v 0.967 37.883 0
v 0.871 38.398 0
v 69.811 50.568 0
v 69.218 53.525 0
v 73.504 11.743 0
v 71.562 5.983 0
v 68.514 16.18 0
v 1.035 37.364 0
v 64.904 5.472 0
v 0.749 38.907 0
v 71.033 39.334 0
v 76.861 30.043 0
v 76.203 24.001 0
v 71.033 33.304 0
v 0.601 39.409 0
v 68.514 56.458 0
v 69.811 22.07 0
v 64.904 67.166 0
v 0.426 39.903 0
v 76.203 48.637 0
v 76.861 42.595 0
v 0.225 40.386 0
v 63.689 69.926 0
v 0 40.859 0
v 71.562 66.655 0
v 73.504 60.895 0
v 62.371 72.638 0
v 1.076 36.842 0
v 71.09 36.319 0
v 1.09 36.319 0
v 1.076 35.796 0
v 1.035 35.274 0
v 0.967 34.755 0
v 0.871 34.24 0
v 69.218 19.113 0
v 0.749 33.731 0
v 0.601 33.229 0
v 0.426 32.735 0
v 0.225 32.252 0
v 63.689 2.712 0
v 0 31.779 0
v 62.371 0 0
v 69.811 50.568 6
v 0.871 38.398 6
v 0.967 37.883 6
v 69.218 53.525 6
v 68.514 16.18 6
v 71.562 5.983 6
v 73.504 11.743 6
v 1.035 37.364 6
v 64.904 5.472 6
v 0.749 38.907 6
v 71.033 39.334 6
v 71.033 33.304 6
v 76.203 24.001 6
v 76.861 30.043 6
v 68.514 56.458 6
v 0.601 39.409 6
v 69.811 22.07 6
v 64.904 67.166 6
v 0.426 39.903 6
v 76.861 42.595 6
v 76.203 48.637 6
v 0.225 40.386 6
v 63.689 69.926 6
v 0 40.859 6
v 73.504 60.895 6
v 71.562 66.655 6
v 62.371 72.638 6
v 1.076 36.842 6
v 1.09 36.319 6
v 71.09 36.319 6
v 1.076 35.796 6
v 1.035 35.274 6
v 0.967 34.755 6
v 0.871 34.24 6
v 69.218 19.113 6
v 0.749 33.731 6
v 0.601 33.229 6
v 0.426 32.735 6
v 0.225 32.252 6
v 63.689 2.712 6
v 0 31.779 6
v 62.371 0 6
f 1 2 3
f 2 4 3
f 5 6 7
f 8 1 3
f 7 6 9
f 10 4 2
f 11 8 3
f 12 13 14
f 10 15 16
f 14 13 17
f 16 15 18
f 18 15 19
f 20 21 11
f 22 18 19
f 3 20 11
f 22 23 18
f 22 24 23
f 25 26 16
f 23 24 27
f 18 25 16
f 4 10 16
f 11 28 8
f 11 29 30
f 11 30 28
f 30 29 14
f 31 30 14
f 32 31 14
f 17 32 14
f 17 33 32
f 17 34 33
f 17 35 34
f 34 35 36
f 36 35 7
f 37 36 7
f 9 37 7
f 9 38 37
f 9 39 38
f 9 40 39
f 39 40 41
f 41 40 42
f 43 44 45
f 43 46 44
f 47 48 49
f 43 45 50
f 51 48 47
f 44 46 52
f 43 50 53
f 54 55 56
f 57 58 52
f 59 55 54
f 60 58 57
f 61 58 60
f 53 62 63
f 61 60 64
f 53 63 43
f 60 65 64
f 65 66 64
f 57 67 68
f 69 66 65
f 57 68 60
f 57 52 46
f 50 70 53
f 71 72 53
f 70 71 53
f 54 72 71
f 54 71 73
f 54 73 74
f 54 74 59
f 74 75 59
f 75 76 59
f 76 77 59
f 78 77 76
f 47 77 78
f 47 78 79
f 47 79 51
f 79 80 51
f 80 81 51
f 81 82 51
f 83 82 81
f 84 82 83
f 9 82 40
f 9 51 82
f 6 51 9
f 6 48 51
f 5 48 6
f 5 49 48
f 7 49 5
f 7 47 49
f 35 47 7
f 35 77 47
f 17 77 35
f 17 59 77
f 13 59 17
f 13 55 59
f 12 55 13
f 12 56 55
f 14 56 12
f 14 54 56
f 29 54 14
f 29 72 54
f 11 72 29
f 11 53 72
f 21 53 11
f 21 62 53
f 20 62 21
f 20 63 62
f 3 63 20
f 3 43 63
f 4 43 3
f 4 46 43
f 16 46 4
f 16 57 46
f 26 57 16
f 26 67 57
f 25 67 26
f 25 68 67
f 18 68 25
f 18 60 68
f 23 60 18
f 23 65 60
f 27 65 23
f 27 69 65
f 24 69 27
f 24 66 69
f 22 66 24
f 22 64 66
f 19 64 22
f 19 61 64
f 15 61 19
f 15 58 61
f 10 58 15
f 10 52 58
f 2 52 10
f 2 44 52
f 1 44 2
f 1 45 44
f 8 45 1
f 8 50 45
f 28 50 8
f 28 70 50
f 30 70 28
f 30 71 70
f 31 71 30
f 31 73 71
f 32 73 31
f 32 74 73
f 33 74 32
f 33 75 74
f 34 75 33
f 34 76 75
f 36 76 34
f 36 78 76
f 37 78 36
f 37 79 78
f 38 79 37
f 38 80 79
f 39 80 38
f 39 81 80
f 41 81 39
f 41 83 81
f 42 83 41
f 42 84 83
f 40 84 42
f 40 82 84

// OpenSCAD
$fn = 32;

// ----------------------------------------------------------------------
// Gear sector: 4 teeth on 54 degrees
// ----------------------------------------------------------------------

// --- parameters (mm) ---
sector_angle = 54;        // sector angle, degrees
root_r = 80;              // root circle radius
tooth_h = 6;              // tooth height over the root circle
teeth = 4;                // number of teeth on the sector
hub_r = 10;               // hub bore radius
plate_t = 6;              // sector thickness, Z
arc_step = 3;             // sampling step of the root/hub arcs, degrees
fit_tol = 0.1;            // declared fit tolerance (prompt contract)
free_tol = 0.3;           // declared free tolerance (prompt contract)

tip_r = root_r + tooth_h;  // tip circle radius

profile = [[62.371, 0], [63.689, 2.712], [64.904, 5.472], [71.562, 5.983], [73.504, 11.743], [68.514, 16.18], [69.218, 19.113], [69.811, 22.07], [76.203, 24.001], [76.861, 30.043], [71.033, 33.304], [71.09, 36.319], [71.033, 39.334], [76.861, 42.595], [76.203, 48.637], [69.811, 50.568], [69.218, 53.525], [68.514, 56.458], [73.504, 60.895], [71.562, 66.655], [64.904, 67.166], [63.689, 69.926], [62.371, 72.638], [0, 40.859], [0.225, 40.386], [0.426, 39.903], [0.601, 39.409], [0.749, 38.907], [0.871, 38.398], [0.967, 37.883], [1.035, 37.364], [1.076, 36.842], [1.09, 36.319], [1.076, 35.796], [1.035, 35.274], [0.967, 34.755], [0.871, 34.24], [0.749, 33.731], [0.601, 33.229], [0.426, 32.735], [0.225, 32.252], [0, 31.779]];  // primary outline, 42 points, counter clockwise

// --- the one profile operation ---
linear_extrude(height = plate_t) polygon(points = profile);
